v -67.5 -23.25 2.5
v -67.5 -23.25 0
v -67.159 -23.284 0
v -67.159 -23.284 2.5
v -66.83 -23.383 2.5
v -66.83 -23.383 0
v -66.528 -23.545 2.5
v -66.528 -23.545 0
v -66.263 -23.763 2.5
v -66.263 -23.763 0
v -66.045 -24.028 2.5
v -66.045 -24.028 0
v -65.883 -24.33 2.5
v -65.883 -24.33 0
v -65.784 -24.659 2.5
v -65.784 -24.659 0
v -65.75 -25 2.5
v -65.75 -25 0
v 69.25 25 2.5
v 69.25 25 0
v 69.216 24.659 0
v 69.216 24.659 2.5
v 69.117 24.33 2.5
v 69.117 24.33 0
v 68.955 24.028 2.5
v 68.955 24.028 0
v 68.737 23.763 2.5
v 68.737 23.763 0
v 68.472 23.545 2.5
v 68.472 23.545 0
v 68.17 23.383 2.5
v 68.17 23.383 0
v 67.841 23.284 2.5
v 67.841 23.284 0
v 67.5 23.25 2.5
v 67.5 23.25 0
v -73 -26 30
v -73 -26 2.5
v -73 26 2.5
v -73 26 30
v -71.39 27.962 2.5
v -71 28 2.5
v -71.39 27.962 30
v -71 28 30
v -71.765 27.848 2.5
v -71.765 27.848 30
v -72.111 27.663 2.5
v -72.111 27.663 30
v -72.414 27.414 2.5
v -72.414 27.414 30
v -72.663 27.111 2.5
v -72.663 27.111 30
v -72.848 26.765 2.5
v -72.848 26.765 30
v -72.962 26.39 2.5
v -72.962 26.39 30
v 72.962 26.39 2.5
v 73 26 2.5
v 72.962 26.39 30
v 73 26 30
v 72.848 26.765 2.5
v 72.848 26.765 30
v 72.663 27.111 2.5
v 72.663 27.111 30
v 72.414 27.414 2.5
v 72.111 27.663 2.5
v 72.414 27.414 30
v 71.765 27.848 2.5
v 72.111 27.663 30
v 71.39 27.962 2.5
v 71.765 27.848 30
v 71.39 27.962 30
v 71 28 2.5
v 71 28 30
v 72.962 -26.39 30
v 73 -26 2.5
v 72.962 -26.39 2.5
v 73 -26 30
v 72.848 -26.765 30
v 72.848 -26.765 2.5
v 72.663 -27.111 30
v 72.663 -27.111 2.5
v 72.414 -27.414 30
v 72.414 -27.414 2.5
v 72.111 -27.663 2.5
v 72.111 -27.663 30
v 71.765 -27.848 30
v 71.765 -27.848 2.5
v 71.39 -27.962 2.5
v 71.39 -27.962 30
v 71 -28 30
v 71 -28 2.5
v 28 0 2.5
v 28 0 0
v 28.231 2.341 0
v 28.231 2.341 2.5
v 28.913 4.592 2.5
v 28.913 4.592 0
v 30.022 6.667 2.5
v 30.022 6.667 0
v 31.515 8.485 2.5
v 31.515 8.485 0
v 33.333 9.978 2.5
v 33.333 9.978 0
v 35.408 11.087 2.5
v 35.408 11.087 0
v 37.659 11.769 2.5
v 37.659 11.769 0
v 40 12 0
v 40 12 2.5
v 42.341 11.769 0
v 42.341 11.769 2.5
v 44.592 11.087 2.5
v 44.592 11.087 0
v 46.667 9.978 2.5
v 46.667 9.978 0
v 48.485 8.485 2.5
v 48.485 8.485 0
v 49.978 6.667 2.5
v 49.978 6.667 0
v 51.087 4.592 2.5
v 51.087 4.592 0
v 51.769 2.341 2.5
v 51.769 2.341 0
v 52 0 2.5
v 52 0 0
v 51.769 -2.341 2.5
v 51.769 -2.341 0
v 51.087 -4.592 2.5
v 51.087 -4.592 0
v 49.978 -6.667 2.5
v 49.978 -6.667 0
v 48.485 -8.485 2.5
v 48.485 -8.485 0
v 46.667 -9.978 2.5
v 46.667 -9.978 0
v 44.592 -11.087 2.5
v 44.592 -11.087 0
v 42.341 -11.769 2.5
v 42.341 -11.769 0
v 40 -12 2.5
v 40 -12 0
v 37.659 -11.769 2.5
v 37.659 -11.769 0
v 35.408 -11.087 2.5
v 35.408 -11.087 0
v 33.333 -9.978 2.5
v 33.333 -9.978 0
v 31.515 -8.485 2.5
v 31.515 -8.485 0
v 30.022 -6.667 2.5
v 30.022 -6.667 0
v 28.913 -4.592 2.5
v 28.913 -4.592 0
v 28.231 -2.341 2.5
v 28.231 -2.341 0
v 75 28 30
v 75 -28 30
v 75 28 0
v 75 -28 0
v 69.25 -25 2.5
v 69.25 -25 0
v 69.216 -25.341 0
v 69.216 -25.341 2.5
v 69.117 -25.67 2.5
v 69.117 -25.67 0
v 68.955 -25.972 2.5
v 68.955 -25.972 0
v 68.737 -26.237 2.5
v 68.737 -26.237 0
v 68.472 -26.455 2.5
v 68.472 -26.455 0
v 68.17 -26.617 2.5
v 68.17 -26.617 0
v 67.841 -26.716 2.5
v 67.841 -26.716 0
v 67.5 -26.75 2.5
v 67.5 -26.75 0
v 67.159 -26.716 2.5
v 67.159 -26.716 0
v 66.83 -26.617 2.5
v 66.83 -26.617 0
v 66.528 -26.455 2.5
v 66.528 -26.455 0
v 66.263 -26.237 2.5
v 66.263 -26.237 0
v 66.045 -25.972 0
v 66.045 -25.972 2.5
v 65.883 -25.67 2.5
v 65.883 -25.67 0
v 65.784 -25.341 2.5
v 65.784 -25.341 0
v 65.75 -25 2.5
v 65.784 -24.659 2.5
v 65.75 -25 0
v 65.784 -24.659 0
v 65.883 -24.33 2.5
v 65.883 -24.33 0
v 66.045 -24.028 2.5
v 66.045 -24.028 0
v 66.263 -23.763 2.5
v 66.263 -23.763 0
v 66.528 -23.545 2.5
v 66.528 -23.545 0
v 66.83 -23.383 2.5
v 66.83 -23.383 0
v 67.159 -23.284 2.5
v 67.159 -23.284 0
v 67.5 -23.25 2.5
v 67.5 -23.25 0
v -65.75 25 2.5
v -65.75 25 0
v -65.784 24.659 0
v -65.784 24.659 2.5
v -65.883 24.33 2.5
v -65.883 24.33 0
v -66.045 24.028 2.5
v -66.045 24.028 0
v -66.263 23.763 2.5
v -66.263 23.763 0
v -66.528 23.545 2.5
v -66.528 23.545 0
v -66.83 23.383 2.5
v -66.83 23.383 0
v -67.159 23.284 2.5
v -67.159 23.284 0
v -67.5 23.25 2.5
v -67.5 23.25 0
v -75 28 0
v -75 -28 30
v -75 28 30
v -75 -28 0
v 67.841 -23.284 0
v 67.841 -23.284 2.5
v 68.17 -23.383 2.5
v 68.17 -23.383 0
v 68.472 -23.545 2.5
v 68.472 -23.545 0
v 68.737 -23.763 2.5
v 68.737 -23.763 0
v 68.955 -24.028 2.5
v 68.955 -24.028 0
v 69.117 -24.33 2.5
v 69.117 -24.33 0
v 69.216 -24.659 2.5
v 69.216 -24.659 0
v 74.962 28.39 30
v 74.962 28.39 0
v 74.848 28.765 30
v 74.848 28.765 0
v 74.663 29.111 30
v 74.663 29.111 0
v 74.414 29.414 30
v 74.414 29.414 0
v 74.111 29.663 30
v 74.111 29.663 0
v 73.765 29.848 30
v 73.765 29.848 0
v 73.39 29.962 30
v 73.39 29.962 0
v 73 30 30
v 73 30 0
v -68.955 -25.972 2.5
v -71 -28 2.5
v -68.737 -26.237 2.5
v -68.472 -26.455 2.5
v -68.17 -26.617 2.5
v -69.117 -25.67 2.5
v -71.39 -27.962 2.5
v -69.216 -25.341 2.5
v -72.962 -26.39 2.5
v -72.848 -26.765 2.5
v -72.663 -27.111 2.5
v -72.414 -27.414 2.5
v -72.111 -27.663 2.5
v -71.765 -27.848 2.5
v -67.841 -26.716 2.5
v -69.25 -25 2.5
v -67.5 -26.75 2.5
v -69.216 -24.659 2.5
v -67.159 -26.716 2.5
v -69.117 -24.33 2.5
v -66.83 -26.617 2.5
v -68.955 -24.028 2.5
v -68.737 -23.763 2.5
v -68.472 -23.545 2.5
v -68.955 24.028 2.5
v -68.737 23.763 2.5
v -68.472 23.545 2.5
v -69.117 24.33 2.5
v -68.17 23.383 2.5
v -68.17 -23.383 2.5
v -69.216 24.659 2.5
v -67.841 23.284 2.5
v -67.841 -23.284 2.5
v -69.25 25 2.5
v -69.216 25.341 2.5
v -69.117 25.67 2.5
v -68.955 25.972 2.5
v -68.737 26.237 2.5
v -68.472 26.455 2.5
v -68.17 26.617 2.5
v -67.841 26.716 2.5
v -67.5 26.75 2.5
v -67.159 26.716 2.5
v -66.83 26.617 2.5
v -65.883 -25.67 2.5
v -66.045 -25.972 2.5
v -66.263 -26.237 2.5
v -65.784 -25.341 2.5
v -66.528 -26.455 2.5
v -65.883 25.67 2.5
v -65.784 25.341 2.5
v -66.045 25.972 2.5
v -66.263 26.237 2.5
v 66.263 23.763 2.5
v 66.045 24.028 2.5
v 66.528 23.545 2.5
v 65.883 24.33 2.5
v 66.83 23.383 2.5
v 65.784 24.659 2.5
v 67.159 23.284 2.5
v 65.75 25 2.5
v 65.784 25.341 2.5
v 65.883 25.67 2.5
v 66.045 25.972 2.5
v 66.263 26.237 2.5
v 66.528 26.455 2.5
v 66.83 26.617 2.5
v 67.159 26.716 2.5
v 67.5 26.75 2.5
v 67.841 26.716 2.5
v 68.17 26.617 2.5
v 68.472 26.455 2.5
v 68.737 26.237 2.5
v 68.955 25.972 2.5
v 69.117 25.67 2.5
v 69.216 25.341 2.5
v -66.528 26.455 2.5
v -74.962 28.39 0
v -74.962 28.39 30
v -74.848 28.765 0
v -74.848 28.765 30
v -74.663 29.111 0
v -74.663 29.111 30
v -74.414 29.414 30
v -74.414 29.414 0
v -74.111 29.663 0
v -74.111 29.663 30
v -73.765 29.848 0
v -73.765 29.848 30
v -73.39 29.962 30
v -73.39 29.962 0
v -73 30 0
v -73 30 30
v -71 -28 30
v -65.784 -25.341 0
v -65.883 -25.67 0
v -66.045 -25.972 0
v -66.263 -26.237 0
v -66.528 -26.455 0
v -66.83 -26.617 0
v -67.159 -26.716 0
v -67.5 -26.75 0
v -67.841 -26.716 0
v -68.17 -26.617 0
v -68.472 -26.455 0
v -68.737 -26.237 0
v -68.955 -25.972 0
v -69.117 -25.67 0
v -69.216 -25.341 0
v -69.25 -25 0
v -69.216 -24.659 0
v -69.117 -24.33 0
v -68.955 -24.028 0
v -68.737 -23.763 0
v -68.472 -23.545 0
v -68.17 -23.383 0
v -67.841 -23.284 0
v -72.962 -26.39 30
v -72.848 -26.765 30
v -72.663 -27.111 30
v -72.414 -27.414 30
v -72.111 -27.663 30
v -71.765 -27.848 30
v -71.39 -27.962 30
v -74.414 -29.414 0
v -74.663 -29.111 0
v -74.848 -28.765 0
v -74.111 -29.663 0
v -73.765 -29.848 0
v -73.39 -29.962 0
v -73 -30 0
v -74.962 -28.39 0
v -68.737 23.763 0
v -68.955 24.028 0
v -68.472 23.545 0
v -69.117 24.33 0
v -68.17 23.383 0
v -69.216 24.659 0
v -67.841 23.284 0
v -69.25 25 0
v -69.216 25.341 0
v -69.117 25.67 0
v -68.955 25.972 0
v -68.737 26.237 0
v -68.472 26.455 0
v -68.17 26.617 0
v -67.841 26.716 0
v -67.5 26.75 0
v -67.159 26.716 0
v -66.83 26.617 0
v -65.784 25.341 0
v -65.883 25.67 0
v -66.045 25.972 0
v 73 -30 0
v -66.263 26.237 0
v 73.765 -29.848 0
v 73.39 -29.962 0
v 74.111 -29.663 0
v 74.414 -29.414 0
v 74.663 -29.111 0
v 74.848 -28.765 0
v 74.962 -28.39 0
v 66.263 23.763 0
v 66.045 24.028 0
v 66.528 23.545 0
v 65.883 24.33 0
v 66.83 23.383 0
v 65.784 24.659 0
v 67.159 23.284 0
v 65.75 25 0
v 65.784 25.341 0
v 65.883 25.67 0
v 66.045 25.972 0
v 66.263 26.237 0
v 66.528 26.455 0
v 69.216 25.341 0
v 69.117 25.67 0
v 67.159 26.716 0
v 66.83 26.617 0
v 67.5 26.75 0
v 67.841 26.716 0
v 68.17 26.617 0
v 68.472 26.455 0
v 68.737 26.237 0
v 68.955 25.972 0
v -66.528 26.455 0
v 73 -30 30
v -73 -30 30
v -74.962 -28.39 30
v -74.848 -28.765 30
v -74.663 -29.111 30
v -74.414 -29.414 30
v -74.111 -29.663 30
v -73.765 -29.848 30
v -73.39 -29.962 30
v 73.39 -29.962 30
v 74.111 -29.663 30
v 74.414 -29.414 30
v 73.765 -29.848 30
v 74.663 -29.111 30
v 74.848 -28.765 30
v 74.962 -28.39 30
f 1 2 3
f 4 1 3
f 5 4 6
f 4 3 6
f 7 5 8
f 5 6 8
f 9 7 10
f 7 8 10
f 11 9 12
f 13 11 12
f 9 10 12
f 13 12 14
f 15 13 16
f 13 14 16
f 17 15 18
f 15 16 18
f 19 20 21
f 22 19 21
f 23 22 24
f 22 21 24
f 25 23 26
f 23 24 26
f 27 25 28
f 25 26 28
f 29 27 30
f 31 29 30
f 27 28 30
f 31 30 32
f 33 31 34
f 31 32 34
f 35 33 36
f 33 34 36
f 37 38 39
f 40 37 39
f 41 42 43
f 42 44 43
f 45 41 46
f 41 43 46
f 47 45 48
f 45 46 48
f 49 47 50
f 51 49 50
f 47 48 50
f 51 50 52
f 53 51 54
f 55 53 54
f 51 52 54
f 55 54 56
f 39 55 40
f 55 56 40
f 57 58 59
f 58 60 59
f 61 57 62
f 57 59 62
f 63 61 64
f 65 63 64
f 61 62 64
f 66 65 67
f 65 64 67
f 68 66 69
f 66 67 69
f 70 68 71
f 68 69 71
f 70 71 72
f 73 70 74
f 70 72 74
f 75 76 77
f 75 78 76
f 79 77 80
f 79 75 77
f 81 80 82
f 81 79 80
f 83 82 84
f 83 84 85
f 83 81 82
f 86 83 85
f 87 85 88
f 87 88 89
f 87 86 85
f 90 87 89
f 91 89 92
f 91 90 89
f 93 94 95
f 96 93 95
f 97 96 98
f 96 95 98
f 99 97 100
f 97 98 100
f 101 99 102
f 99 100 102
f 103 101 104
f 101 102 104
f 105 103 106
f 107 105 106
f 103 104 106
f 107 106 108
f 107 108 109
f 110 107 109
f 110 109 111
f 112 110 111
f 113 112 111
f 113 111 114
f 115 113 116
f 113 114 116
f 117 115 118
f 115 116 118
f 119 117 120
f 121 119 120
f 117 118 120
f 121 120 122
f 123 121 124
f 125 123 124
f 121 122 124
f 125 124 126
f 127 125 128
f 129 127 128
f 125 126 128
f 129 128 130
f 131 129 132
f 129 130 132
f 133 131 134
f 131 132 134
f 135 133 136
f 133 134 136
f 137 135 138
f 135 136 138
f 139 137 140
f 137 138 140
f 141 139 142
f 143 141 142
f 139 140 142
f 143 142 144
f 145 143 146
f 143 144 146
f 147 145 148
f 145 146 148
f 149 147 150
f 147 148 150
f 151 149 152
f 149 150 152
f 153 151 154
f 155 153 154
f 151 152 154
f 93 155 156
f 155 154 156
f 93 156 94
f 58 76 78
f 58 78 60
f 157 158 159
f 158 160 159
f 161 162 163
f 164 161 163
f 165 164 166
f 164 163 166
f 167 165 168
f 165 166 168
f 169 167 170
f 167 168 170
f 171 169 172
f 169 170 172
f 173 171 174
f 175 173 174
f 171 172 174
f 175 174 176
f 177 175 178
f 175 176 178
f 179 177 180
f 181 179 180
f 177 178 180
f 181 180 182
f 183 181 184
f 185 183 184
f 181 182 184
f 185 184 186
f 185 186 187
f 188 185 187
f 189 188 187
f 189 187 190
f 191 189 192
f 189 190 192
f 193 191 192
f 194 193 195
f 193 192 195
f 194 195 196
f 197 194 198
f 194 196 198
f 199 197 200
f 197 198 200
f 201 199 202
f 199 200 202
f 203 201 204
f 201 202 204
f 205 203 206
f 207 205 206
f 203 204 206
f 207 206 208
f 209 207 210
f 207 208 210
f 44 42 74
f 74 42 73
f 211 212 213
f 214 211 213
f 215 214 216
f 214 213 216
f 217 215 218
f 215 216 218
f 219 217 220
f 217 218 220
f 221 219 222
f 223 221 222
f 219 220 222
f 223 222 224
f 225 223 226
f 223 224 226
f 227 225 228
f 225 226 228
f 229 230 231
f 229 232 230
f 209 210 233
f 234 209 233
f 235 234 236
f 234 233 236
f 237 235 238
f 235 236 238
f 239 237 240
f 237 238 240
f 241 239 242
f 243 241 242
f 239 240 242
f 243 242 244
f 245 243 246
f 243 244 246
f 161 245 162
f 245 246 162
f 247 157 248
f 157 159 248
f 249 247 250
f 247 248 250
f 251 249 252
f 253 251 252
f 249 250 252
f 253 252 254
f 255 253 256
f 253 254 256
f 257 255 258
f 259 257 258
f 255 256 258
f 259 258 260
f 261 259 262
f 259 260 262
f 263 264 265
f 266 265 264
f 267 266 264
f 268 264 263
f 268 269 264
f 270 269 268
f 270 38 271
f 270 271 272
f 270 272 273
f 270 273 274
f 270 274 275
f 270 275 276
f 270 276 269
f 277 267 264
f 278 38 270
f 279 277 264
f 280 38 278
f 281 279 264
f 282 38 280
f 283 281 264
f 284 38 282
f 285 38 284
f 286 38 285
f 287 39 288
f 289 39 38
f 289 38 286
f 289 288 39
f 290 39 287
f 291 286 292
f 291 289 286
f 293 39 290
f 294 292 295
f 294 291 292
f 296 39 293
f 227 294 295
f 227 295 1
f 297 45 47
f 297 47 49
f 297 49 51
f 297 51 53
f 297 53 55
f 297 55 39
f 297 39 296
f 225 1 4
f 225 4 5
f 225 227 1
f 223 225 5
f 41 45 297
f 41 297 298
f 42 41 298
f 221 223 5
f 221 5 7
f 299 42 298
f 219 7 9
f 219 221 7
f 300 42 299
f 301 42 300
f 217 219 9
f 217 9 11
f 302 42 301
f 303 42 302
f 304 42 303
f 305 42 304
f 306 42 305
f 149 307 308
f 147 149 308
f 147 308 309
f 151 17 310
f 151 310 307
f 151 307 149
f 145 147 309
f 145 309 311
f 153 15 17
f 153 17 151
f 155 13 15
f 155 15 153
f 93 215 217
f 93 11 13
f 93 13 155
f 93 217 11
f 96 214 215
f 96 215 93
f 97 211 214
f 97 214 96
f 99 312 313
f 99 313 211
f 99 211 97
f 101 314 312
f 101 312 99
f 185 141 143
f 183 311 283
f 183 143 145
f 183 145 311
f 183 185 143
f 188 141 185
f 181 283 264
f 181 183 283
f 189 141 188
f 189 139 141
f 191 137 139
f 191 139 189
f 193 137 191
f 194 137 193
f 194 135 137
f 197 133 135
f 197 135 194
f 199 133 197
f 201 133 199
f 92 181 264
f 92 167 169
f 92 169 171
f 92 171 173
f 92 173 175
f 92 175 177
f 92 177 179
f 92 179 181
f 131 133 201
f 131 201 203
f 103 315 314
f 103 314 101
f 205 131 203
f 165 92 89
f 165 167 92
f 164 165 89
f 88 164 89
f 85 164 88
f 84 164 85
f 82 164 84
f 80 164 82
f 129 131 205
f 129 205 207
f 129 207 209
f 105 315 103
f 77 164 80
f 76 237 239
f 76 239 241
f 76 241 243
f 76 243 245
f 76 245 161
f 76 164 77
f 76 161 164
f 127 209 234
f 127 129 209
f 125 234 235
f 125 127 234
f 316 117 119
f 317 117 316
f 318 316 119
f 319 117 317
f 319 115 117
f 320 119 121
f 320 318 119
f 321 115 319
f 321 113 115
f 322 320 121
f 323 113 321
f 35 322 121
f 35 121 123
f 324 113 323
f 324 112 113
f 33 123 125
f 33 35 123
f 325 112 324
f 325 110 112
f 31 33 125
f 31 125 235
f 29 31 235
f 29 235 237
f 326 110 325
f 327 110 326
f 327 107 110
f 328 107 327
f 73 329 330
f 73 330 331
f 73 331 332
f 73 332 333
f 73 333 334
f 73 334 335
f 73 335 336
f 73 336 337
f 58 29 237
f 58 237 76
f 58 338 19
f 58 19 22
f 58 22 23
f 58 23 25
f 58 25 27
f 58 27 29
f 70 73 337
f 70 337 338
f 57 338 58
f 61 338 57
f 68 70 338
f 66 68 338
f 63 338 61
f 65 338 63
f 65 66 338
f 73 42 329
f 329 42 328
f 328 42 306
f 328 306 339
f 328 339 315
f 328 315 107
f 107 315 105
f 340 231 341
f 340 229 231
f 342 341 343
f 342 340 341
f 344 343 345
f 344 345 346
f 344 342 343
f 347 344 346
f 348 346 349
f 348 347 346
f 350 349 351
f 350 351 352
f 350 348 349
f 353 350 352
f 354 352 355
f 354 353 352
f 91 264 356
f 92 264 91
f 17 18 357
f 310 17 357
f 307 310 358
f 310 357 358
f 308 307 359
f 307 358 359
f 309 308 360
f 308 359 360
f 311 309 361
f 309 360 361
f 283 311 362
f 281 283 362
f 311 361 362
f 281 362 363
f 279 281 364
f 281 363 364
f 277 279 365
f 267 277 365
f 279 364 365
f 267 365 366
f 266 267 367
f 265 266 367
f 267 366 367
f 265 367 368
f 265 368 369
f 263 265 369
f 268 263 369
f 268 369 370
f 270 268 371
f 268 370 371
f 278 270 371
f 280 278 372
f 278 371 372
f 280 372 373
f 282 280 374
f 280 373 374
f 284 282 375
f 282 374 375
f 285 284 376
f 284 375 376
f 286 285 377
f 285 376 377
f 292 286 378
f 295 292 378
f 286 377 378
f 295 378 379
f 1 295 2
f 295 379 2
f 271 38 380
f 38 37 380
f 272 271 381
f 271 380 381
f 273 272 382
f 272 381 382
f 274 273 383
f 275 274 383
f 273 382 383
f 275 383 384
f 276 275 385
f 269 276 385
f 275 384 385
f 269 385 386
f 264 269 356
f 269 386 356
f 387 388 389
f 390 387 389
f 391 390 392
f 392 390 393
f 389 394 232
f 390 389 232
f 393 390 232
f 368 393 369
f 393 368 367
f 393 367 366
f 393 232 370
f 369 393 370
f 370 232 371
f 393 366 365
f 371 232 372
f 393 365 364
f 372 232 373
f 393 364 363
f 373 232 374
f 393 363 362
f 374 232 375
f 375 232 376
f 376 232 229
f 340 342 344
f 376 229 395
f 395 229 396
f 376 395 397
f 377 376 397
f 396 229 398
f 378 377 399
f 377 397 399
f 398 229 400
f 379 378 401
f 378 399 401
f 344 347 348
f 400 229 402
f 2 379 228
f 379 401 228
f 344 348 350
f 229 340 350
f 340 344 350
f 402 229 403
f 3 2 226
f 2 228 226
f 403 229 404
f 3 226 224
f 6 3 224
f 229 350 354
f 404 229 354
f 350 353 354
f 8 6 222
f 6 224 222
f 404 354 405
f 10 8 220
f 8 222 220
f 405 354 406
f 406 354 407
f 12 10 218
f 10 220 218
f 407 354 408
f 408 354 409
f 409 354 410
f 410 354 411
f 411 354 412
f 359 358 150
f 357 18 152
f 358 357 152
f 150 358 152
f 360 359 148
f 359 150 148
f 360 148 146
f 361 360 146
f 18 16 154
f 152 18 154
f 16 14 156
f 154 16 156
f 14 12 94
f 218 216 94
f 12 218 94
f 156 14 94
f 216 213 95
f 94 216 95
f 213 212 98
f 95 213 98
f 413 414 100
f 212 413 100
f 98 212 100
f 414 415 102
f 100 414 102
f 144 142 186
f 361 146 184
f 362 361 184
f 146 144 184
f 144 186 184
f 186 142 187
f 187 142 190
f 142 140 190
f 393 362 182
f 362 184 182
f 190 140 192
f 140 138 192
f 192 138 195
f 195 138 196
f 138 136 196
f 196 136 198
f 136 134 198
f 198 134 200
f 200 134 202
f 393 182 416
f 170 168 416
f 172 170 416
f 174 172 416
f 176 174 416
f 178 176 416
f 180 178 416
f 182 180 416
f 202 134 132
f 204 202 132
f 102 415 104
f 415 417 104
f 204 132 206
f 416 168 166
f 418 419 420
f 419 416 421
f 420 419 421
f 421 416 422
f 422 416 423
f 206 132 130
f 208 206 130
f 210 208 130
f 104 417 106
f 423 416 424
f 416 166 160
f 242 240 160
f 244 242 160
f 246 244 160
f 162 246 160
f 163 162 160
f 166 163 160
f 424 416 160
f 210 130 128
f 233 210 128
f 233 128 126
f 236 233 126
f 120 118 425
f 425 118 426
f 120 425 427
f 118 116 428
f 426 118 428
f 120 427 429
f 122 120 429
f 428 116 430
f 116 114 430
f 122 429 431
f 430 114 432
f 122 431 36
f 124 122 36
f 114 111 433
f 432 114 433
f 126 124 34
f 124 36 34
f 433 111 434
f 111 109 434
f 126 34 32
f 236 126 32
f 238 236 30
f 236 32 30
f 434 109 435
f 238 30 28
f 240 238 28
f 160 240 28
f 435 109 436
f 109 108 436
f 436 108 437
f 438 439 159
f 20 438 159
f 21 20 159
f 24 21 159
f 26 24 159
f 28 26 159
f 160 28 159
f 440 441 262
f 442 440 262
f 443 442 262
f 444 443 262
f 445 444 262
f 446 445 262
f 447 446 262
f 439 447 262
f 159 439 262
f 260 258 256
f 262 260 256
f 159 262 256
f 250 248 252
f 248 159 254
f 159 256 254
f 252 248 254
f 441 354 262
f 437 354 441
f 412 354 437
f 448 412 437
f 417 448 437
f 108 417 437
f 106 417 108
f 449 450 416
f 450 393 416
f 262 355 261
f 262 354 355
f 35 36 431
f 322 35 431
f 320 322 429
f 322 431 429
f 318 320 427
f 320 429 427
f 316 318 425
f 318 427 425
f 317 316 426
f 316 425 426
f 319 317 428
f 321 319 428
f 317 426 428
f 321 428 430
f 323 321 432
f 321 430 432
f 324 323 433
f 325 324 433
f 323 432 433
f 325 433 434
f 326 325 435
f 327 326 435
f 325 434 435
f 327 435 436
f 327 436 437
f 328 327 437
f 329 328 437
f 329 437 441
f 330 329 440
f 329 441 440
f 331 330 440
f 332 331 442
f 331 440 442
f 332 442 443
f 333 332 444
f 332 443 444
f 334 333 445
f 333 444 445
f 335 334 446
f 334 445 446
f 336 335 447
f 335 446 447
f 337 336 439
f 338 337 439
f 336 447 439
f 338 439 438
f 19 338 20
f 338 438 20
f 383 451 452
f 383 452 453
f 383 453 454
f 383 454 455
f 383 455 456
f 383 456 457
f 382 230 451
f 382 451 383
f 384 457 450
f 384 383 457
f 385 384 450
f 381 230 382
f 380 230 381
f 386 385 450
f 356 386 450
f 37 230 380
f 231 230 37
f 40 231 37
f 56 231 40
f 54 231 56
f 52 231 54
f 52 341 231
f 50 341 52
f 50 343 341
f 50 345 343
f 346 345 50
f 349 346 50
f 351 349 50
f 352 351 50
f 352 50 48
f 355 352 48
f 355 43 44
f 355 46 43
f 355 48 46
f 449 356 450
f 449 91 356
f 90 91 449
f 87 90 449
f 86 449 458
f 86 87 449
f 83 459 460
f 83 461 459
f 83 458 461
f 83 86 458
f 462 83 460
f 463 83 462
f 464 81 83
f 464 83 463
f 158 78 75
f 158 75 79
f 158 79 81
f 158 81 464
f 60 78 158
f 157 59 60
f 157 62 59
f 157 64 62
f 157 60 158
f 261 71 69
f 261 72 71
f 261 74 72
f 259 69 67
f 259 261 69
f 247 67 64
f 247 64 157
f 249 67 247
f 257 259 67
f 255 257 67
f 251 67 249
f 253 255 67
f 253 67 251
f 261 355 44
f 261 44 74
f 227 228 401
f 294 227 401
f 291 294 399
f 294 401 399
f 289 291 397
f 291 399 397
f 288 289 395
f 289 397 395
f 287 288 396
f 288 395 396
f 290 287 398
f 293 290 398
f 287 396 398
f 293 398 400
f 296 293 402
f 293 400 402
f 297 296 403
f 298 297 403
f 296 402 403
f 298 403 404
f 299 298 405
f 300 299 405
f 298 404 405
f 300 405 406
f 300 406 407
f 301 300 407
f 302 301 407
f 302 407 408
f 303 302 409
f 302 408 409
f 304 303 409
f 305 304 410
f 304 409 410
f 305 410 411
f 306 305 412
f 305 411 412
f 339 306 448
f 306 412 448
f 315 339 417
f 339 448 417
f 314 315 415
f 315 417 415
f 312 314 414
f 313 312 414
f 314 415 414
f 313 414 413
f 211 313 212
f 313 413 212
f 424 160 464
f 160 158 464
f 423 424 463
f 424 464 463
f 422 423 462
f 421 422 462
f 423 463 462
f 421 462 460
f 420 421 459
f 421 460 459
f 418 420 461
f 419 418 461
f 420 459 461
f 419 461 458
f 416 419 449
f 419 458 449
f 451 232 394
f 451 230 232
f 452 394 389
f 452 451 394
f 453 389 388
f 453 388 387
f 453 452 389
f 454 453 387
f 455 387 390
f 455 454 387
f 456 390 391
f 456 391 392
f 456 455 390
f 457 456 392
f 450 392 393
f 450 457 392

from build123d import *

# Parameters (mm, degrees)
F0_W     = 150
F0_H     = 60
F1_DEPTH = 2.5
F2_W     = 150
F2_H     = 60
F2_W_2   = 146
F2_H_2   = 56
F3_DEPTH = 30
F4_R     = 2


with BuildPart() as f1:
    # F0 (on Top) → F1 (new body)
    with BuildSketch(Plane.XY):
        Rectangle(F0_W, F0_H)
        with BuildLine():
            ThreePointArc((-65.75, -25), (-68.7374368671, -26.2374368671), (-67.5, -23.25))
            ThreePointArc((-67.5, -23.25), (-66.2625631329, -23.7625631329), (-65.75, -25))
        make_face(mode=Mode.SUBTRACT)
        with BuildLine():
            ThreePointArc((69.25, -25), (66.2625631329, -26.2374368671), (67.5, -23.25))
            ThreePointArc((67.5, -23.25), (68.7374368671, -23.7625631329), (69.25, -25))
        make_face(mode=Mode.SUBTRACT)
        with BuildLine():
            ThreePointArc((-65.75, 25), (-66.2625631329, 23.7625631329), (-67.5, 23.25))
            ThreePointArc((-67.5, 23.25), (-68.7374368671, 26.2374368671), (-65.75, 25))
        make_face(mode=Mode.SUBTRACT)
        with BuildLine():
            ThreePointArc((52, 0), (40, -12), (28, 0))
            ThreePointArc((28, 0), (40, 12), (52, 0))
        make_face(mode=Mode.SUBTRACT)
        with BuildLine():
            ThreePointArc((69.25, 25), (68.7374368671, 23.7625631329), (67.5, 23.25))
            ThreePointArc((67.5, 23.25), (66.2625631329, 26.2374368671), (69.25, 25))
        make_face(mode=Mode.SUBTRACT)
    extrude(amount=F1_DEPTH)

    # F2 (on Top) → F3 (join)
    with BuildSketch(Plane.XY):
        Rectangle(F2_W, F2_H)
        Rectangle(F2_W_2, F2_H_2, mode=Mode.SUBTRACT)
    extrude(amount=F3_DEPTH)

    # F4
    f4_edges = [f1.edges().sort_by_distance(p)[0] for p in [
        (-73, 28, 16.25),
        (73, 28, 16.25),
        (-73, -28, 16.25),
        (73, -28, 16.25),
        (-75, 30, 15),
        (-75, -30, 15),
        (75, -30, 15),
        (75, 30, 15),
    ]]
    fillet(f4_edges, radius=F4_R)


solid = f1.part
